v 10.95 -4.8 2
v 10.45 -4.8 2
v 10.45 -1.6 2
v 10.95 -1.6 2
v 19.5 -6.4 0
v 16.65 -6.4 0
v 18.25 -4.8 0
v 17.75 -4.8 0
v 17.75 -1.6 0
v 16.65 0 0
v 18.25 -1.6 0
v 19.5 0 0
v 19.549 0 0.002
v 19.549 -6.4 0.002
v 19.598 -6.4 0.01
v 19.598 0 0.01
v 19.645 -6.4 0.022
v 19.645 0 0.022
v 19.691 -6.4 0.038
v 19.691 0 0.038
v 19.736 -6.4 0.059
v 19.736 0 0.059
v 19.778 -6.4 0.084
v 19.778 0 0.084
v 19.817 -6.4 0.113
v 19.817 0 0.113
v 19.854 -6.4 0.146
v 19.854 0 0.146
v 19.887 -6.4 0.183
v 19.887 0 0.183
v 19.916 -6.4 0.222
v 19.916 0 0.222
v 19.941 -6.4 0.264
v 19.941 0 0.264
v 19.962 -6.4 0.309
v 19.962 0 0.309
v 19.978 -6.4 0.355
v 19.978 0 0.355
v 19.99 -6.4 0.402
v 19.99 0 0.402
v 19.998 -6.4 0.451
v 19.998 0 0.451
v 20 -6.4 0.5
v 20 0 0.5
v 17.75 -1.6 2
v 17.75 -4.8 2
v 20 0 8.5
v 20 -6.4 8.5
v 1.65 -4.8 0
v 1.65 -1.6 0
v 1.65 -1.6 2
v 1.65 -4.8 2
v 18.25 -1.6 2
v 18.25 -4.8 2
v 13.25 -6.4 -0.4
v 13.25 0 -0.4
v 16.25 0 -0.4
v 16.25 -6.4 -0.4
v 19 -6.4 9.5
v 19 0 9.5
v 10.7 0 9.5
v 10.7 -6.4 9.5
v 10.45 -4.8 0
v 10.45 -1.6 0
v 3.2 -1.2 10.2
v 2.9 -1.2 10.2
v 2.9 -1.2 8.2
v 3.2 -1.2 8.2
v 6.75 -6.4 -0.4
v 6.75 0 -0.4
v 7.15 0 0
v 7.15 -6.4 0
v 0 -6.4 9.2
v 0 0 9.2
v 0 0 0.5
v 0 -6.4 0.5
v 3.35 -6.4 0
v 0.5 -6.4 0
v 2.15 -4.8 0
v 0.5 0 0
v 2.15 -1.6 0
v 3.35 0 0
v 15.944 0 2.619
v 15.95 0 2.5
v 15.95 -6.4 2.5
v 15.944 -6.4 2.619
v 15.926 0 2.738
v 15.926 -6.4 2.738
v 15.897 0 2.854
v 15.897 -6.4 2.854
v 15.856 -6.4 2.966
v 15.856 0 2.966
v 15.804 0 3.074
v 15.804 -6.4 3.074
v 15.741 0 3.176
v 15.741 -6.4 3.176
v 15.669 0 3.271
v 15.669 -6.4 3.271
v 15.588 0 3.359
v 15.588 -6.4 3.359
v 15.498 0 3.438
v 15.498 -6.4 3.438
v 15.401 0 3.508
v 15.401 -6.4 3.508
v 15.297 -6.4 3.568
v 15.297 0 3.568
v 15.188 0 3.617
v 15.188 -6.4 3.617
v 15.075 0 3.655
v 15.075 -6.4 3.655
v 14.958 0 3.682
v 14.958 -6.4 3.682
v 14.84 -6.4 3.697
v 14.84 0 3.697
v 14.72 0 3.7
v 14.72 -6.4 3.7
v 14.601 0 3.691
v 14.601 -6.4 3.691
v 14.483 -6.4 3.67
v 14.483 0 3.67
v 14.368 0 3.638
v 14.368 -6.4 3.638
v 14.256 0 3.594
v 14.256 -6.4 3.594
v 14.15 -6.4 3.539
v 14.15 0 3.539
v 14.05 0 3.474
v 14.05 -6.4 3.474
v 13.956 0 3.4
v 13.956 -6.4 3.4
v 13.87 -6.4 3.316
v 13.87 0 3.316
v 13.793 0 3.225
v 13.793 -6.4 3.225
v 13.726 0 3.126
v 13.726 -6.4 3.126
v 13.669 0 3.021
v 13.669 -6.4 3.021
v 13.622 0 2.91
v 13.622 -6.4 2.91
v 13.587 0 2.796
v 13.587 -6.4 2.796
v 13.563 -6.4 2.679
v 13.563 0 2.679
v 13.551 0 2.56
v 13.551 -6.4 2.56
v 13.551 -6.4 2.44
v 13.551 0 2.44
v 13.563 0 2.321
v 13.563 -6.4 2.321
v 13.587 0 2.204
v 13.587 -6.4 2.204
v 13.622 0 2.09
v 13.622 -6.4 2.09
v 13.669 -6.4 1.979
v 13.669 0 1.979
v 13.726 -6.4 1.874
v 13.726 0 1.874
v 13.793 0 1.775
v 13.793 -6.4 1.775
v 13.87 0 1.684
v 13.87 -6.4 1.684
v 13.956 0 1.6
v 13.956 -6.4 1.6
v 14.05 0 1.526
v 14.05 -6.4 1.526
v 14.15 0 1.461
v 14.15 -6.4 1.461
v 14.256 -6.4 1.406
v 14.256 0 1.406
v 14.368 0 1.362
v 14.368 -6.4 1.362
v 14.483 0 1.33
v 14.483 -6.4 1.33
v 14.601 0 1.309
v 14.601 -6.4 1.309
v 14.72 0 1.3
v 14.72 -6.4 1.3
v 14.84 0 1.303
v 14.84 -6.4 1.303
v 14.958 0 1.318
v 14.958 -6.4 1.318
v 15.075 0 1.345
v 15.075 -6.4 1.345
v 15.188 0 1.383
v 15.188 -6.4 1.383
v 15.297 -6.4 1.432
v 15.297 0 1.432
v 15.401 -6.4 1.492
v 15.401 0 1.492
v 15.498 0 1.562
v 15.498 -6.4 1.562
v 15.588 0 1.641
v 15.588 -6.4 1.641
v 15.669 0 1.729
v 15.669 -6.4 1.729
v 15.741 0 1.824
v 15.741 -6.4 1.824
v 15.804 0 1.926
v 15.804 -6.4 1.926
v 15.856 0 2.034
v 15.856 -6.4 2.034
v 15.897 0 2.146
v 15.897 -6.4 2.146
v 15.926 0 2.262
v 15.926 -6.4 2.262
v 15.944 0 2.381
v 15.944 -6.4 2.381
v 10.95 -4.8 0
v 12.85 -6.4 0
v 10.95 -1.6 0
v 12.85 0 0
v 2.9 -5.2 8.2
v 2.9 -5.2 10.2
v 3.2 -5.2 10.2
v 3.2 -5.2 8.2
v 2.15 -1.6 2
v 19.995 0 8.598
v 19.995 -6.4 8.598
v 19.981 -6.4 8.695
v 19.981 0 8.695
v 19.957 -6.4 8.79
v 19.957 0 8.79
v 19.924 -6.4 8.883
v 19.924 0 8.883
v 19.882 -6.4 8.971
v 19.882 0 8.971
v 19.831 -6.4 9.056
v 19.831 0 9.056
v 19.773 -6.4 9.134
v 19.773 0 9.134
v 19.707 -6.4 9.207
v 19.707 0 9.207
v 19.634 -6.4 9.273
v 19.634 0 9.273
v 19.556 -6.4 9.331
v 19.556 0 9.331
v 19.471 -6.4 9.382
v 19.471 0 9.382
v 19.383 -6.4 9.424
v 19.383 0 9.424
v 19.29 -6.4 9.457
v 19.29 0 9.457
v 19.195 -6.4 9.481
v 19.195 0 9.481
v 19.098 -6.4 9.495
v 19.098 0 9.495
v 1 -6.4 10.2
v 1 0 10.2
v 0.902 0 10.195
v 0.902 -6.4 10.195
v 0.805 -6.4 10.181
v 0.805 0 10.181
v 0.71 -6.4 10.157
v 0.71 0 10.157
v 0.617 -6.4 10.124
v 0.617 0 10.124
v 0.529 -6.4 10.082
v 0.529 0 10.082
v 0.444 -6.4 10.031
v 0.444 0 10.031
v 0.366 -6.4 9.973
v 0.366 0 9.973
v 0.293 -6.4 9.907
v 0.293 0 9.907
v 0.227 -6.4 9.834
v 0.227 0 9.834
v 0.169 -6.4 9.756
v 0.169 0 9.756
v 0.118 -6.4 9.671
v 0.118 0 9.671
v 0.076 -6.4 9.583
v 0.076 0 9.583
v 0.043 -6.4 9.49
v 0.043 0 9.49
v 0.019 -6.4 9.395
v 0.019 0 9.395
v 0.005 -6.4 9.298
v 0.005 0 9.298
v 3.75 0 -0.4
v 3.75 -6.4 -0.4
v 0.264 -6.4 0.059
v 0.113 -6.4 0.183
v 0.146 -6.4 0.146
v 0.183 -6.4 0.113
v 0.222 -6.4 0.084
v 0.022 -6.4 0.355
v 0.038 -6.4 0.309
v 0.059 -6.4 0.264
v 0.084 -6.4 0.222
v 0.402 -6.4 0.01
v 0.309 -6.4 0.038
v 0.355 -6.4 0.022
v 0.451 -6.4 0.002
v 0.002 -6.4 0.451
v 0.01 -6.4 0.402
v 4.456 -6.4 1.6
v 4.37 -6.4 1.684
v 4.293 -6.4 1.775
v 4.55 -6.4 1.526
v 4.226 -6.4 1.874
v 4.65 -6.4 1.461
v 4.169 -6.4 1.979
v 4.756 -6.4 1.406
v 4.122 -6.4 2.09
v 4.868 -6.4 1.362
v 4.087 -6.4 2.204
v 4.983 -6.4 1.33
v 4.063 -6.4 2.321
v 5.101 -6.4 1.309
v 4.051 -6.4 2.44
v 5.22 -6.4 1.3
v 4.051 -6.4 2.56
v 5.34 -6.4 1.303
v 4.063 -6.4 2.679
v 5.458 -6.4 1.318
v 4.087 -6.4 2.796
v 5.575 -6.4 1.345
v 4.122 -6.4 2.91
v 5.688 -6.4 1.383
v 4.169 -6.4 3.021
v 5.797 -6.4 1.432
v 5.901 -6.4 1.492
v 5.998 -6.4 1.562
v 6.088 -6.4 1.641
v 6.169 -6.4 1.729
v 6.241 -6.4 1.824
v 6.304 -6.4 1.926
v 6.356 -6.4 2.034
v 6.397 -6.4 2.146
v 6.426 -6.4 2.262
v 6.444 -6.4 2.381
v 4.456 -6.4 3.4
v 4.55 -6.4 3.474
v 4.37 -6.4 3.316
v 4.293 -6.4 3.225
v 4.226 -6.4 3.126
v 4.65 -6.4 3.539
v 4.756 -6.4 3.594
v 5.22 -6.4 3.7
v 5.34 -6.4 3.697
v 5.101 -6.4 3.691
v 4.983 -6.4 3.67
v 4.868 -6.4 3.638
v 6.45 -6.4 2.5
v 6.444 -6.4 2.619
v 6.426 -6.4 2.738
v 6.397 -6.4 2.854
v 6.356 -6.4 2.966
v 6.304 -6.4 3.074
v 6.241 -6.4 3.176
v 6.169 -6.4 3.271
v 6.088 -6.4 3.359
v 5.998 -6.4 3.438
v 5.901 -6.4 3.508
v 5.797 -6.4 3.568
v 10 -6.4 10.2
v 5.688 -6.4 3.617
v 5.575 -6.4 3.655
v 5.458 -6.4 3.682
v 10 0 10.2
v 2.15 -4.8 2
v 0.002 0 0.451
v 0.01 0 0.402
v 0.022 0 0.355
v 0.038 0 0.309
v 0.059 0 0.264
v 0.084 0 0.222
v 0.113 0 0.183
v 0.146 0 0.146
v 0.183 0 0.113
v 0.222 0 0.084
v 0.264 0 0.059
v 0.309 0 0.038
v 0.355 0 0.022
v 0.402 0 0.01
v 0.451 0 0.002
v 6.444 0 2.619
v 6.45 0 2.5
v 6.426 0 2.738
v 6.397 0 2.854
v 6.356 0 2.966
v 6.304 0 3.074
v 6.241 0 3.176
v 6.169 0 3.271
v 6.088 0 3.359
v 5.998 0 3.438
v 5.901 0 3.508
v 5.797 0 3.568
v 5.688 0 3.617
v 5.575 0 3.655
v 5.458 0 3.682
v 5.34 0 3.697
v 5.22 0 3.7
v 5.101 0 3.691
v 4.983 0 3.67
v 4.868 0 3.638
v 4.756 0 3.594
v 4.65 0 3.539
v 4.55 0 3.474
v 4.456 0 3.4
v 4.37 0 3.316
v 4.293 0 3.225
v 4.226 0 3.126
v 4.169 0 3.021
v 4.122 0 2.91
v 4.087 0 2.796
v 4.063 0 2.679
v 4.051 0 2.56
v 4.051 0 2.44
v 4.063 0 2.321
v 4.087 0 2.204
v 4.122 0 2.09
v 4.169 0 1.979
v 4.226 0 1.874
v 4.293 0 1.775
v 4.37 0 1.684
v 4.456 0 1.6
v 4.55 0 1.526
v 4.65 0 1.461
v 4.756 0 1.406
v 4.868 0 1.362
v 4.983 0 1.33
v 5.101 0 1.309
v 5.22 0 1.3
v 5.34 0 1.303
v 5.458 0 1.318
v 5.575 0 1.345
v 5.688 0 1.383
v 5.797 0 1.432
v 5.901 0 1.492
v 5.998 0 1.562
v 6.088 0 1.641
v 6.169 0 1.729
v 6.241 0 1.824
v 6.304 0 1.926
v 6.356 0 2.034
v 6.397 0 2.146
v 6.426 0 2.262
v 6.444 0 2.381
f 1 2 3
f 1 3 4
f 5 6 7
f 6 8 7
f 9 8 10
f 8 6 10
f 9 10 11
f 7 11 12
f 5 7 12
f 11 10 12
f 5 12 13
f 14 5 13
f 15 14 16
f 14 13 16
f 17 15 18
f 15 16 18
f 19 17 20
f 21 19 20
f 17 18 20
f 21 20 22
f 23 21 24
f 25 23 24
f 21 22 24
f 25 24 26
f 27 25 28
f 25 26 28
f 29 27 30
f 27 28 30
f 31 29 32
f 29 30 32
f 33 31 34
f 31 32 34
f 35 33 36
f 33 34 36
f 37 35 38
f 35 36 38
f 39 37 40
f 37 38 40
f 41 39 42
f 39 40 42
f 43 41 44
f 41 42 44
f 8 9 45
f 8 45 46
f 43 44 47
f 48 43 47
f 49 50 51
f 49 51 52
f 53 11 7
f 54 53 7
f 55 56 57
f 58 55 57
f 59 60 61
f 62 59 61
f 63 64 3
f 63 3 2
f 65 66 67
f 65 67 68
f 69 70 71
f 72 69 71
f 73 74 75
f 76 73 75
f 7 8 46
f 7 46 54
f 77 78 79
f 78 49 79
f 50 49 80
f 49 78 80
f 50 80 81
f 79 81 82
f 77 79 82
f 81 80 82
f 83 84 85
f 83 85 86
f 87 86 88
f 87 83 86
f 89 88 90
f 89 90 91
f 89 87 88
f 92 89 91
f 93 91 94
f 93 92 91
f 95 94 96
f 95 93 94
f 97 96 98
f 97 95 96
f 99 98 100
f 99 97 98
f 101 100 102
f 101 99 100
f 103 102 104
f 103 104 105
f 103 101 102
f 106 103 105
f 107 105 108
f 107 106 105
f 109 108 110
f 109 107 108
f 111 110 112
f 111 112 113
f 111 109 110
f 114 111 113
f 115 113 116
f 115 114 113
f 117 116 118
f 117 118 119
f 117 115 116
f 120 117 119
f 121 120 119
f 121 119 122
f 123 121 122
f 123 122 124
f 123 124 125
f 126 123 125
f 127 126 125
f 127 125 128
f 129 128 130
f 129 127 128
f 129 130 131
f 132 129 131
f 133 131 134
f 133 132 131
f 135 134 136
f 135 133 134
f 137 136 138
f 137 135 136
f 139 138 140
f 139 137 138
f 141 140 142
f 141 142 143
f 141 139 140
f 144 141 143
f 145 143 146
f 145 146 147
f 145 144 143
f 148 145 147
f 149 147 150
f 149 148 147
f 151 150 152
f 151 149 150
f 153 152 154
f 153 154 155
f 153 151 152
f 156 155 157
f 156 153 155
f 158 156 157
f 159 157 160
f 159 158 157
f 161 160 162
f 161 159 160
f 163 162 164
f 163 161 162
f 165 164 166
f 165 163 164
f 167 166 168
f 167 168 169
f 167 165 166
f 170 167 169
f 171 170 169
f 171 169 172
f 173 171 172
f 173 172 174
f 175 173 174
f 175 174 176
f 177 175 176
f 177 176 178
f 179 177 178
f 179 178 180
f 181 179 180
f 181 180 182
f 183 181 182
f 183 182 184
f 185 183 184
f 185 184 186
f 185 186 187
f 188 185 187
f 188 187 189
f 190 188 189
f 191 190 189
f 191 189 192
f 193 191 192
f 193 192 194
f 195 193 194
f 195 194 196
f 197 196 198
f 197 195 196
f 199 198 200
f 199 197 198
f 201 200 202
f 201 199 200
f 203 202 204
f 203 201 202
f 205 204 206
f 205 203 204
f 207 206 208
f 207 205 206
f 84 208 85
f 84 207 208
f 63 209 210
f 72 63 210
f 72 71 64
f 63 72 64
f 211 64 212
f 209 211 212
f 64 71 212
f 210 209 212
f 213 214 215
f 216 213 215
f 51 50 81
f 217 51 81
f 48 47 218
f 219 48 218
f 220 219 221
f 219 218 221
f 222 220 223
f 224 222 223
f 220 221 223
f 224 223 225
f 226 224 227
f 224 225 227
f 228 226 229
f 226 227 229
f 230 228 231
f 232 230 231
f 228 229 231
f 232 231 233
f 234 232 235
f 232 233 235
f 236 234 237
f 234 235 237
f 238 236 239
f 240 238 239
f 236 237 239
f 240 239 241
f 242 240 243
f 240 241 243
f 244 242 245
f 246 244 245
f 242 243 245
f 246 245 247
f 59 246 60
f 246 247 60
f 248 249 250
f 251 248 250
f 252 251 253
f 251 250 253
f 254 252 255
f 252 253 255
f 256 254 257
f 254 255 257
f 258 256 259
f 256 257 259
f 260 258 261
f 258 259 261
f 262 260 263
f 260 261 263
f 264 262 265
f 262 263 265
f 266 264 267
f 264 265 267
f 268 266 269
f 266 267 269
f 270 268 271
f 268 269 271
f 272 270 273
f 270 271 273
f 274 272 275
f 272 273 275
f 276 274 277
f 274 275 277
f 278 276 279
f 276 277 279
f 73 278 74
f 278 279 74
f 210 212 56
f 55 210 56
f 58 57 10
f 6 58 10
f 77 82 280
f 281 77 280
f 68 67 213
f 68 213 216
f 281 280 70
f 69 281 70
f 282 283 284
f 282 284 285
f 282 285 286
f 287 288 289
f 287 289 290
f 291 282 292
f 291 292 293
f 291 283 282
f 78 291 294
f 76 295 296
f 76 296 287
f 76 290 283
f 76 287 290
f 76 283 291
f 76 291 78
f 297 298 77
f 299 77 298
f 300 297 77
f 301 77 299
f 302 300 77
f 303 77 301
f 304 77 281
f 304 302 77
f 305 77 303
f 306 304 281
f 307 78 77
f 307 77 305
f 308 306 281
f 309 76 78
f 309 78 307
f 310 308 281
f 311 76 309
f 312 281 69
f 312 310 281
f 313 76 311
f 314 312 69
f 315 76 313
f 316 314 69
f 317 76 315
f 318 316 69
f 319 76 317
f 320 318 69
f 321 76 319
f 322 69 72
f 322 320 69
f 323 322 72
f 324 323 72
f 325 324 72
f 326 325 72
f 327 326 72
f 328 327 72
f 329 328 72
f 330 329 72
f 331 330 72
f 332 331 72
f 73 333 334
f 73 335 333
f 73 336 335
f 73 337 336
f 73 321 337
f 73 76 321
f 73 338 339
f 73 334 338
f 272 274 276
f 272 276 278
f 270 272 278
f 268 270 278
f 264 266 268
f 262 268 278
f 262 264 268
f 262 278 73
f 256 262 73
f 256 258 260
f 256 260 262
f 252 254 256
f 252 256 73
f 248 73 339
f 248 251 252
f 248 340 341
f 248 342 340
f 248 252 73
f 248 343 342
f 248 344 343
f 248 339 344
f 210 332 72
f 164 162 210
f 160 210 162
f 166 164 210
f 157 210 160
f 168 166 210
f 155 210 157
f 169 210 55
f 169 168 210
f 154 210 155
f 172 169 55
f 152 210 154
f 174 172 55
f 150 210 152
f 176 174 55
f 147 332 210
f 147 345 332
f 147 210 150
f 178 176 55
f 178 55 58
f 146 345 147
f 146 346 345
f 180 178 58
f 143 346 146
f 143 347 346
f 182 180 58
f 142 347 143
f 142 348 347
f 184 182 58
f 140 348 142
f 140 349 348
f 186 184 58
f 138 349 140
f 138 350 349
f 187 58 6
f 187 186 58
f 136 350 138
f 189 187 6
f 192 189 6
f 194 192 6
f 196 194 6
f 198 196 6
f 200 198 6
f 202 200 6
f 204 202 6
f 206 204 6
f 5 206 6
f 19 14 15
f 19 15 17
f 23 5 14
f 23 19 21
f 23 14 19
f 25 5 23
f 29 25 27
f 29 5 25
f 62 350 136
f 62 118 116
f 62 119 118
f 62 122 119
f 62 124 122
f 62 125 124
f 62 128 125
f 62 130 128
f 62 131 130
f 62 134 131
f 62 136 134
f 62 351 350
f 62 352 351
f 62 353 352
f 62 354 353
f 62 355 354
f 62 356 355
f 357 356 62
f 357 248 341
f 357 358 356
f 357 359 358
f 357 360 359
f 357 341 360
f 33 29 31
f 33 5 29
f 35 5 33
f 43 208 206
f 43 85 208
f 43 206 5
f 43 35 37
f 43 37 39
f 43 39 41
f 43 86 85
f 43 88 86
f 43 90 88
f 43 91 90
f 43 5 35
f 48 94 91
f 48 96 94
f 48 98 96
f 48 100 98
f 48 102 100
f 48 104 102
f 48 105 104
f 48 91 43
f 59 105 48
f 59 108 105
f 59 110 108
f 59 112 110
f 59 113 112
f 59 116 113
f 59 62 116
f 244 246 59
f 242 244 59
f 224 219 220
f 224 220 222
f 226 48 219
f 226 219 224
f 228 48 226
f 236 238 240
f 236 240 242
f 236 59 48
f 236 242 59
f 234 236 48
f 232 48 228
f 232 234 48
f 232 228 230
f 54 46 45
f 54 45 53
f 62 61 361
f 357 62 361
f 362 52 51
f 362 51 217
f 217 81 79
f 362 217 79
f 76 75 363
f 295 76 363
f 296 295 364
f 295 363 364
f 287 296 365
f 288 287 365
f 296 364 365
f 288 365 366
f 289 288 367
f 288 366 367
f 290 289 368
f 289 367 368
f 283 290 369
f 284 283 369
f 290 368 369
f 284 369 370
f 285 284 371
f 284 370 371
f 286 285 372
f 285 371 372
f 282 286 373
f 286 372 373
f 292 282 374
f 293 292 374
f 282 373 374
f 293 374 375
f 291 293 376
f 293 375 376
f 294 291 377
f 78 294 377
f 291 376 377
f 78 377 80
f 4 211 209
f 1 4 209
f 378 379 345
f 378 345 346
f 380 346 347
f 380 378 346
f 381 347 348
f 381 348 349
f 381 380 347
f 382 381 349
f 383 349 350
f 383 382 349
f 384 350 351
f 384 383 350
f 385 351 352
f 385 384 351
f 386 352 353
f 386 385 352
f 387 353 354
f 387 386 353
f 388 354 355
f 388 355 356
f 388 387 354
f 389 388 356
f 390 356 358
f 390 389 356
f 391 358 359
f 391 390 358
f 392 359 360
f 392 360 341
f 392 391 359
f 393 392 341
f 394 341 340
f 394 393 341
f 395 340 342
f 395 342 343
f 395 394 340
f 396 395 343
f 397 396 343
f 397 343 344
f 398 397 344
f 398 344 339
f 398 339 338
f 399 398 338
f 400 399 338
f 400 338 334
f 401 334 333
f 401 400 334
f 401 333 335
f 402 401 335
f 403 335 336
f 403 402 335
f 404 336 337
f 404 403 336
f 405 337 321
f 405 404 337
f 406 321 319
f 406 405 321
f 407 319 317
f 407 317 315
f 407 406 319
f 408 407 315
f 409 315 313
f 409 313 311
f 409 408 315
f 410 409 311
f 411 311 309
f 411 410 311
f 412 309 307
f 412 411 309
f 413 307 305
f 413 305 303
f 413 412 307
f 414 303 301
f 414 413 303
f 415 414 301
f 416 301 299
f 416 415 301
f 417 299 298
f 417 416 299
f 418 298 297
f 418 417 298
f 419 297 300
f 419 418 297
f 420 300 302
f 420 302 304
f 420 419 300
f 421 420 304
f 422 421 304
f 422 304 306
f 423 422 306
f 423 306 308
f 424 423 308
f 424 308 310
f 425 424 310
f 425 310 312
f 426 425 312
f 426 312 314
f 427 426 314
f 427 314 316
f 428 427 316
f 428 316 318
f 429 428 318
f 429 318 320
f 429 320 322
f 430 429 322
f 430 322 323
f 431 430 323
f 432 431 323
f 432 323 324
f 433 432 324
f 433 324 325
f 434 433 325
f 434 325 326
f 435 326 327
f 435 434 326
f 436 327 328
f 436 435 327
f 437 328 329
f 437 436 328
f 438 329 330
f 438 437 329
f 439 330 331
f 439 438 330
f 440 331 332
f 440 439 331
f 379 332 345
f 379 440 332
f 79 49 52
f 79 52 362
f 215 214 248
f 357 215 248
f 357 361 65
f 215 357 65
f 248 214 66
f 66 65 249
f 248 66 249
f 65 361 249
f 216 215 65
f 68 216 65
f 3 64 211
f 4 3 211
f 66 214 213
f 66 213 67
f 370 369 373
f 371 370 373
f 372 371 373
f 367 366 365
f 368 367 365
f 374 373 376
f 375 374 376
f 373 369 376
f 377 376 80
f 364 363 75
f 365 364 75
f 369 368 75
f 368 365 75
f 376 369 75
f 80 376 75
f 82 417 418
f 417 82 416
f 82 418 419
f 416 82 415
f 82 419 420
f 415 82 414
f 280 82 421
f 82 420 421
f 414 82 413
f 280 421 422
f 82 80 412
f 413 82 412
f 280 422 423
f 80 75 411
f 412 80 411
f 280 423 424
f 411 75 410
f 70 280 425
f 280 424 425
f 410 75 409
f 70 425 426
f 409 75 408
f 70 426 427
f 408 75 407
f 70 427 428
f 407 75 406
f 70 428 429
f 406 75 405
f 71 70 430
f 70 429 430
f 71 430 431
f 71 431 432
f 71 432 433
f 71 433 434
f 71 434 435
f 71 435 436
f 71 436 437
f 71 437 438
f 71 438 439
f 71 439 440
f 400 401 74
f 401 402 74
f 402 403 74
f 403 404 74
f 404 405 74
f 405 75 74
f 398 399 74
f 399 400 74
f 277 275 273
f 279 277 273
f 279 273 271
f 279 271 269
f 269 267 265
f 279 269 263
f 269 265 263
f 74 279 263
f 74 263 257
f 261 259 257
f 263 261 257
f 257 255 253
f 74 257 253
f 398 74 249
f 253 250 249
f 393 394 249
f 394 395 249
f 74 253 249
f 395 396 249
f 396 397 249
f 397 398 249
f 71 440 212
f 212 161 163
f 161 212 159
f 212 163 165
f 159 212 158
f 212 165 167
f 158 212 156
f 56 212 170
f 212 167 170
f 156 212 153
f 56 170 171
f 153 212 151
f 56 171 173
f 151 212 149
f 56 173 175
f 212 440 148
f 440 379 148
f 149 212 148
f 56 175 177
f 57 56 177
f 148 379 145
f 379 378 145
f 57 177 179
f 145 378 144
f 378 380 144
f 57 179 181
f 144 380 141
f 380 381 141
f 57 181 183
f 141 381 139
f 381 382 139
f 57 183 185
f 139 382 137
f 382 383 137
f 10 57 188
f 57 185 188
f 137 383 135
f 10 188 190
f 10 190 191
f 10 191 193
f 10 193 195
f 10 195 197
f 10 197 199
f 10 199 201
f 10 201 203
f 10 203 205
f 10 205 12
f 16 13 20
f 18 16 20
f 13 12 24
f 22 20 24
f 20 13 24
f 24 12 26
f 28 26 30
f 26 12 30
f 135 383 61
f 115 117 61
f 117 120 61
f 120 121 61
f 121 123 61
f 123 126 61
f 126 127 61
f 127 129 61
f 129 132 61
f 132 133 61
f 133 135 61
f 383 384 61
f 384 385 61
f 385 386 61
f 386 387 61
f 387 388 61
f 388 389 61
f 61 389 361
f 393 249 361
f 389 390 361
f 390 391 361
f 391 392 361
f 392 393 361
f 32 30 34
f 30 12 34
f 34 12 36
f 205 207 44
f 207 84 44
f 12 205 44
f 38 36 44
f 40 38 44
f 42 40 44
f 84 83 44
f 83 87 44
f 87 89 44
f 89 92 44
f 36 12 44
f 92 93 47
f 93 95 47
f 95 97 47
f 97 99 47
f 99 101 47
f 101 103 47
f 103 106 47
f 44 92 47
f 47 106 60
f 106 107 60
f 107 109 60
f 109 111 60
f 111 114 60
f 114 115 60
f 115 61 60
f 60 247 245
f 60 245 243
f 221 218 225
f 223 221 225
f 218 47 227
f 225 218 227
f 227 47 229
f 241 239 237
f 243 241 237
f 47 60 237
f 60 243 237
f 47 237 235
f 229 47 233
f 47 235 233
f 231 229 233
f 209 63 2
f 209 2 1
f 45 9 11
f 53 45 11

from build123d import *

# Parameters (mm, degrees)
F0_R     = 1.2
F1_DEPTH = 6.4
F2_W     = 0.5
F2_H     = 3.2
F3_DEPTH = 2
F4_W     = 0.3
F4_H     = 4
F5_DEPTH = 2


with BuildPart() as f1:
    # F0 (on Front) → F1 (new body)
    with BuildSketch(Plane.XZ):
        with BuildLine():
            ThreePointArc((0, 0.5), (0.146447, 0.146447), (0.5, 0))
            Line((0.5, 0), (3.35, 0))
            Line((3.35, 0), (3.75, -0.4))
            Line((3.75, -0.4), (6.75, -0.4))
            Line((6.75, -0.4), (7.15, 0))
            Line((7.15, 0), (12.85, 0))
            Line((12.85, 0), (13.25, -0.4))
            Line((13.25, -0.4), (16.25, -0.4))
            Line((16.25, -0.4), (16.65, 0))
            Line((16.65, 0), (19.5, 0))
            ThreePointArc((19.5, 0), (19.853553, 0.146447), (20, 0.5))
            Line((20, 0.5), (20, 8.5))
            ThreePointArc((20, 8.5), (19.707107, 9.207107), (19, 9.5))
            Line((19, 9.5), (10.7, 9.5))
            Line((10.7, 9.5), (10, 10.2))
            Line((10, 10.2), (1, 10.2))
            ThreePointArc((1, 10.2), (0.292893, 9.907107), (0, 9.2))
            Line((0, 9.2), (0, 0.5))
        make_face()
        with Locations((5.25, 2.5)):
            Circle(F0_R, mode=Mode.SUBTRACT)
        with Locations((14.75, 2.5)):
            Circle(F0_R, mode=Mode.SUBTRACT)
    extrude(amount=F1_DEPTH)

    # F2 (on face) → F3 (cut)
    with BuildSketch(Plane(origin=(0, 0, 0), x_dir=(1, 0, 0), z_dir=(0, 0, -1))):
        with Locations((1.9, 3.2)):
            Rectangle(F2_W, F2_H)
        with Locations((10.7, 3.2)):
            Rectangle(F2_W, F2_H)
        with Locations((18, 3.2)):
            Rectangle(F2_W, F2_H)
    extrude(amount=-F3_DEPTH, mode=Mode.SUBTRACT)

    # F4 (on face) → F5 (cut)
    with BuildSketch(Plane.XY.offset(10.2)):
        with Locations((3.05, -3.2)):
            Rectangle(F4_W, F4_H)
    extrude(amount=-F5_DEPTH, mode=Mode.SUBTRACT)


solid = f1.part
